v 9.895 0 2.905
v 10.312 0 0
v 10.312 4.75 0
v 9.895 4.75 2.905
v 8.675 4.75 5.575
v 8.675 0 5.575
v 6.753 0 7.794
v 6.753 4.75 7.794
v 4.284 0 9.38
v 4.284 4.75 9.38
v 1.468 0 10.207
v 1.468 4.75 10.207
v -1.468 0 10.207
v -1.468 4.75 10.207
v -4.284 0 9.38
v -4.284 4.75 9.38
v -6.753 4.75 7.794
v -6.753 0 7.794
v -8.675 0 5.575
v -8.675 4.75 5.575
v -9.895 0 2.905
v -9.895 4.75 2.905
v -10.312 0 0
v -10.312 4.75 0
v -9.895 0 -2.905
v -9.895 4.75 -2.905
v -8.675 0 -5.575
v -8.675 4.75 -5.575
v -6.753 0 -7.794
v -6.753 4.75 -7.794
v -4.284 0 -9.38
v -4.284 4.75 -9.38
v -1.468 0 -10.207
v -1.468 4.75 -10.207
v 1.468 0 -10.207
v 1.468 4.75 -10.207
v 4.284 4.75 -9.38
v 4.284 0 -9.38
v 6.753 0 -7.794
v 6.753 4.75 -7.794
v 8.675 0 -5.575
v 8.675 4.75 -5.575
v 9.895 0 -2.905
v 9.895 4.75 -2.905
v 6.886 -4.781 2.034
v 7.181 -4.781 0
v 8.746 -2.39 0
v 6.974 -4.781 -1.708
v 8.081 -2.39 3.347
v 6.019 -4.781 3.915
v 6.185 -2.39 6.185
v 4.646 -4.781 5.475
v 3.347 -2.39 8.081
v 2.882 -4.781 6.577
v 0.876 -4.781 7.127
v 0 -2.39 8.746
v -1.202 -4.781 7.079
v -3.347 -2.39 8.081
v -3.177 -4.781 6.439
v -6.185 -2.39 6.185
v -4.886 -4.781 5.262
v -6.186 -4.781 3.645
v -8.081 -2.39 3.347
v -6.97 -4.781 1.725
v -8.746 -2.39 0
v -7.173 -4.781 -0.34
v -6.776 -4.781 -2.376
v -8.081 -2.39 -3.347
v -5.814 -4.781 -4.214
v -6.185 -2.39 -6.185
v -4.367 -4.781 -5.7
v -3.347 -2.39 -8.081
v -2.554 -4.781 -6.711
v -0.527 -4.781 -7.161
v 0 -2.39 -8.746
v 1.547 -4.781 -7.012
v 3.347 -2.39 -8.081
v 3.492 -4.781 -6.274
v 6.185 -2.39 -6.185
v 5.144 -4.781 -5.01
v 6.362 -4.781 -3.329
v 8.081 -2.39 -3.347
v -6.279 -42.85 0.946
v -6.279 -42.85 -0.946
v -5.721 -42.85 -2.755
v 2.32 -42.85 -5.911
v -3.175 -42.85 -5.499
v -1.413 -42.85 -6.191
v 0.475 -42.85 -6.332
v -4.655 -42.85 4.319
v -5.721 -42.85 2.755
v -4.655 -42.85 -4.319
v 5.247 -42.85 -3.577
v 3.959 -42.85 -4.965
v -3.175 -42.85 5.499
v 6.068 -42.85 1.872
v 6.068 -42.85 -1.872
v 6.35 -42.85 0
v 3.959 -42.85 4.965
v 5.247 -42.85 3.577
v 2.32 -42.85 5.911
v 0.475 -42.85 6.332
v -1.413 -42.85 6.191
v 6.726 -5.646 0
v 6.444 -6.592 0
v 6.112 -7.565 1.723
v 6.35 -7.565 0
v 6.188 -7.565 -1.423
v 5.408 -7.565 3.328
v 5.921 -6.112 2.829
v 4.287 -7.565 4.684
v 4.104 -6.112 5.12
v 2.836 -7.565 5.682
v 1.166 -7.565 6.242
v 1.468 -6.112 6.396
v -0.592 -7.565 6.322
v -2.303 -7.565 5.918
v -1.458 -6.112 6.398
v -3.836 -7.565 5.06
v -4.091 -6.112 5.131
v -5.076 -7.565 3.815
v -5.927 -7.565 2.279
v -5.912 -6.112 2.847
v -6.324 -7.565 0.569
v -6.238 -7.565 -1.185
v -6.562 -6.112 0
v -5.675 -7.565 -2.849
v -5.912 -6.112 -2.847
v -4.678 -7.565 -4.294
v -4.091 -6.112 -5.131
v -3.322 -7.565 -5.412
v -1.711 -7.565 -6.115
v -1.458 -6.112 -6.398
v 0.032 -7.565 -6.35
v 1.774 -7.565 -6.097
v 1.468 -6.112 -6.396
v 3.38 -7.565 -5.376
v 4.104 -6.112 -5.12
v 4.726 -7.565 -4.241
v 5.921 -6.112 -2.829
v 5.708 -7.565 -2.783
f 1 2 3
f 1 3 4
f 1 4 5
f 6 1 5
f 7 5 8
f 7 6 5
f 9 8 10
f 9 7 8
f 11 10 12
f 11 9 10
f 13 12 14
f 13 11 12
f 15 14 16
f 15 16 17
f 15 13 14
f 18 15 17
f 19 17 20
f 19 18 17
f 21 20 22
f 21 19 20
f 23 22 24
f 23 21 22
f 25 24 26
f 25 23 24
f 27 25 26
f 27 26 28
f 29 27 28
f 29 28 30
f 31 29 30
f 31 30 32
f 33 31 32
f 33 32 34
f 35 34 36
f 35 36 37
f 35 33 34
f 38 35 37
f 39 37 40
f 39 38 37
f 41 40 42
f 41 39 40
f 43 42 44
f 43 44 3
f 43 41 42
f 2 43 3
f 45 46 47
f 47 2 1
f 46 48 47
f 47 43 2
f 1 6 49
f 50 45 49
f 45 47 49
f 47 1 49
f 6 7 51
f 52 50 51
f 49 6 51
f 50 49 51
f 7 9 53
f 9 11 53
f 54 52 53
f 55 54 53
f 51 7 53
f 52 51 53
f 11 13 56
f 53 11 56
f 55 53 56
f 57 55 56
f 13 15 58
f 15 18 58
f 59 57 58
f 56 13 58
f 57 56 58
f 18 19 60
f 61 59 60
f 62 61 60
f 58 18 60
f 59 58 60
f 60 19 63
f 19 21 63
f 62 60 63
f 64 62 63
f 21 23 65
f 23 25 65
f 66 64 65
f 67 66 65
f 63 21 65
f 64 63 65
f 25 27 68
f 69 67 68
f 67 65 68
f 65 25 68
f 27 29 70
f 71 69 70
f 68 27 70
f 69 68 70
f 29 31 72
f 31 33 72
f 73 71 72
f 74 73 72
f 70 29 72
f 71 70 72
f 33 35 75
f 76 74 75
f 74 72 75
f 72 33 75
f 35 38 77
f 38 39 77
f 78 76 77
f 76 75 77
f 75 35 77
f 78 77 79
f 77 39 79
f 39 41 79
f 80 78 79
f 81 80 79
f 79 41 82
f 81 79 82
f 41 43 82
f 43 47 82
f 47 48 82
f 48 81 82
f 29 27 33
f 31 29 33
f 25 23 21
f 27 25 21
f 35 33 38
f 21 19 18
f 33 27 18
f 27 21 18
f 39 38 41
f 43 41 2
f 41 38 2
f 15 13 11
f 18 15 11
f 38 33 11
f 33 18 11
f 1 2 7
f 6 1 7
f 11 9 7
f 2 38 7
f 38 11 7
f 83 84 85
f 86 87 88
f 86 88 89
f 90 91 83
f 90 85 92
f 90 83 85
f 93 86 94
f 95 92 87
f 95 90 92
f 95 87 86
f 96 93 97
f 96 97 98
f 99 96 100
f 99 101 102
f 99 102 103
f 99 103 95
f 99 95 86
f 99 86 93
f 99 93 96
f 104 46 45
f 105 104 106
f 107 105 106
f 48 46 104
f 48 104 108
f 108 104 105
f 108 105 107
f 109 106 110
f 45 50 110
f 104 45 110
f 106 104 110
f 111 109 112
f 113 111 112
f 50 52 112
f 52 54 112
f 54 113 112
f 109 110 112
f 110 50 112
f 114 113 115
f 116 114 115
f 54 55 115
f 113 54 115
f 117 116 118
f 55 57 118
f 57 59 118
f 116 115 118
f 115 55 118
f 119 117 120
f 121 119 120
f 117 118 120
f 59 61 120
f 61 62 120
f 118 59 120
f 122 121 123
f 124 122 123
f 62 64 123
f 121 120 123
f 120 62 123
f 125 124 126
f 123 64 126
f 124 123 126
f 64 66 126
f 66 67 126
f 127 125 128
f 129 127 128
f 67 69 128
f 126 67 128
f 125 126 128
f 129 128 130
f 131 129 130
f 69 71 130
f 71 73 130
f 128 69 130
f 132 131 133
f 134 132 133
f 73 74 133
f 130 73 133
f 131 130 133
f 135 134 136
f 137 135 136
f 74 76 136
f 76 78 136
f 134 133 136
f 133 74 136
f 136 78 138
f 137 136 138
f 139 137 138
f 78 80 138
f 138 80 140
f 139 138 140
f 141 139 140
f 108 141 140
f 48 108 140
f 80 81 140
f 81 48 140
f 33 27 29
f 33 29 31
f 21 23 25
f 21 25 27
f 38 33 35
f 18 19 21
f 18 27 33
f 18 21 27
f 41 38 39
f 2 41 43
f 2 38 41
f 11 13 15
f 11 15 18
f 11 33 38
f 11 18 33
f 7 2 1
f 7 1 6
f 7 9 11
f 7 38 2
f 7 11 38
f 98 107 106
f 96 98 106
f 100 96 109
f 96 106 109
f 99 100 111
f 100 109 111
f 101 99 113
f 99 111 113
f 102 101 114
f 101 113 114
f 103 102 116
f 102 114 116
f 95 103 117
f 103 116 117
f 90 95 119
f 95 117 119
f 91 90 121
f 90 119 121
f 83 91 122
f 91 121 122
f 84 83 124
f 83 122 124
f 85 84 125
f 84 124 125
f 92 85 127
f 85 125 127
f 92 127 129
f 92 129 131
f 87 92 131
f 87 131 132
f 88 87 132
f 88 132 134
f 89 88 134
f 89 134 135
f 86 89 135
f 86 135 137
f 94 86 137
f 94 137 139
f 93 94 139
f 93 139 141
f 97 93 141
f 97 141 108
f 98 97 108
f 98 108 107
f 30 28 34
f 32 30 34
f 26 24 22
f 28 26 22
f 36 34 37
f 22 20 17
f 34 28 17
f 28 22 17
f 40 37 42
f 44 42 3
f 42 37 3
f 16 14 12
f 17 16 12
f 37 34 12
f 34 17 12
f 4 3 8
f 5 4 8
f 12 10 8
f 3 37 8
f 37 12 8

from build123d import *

# Parameters (mm, degrees)
F0_R     = 6.35
F1_DEPTH = 42.8498
F0_R_2   = 10.3124
F2_DEPTH = 4.7498
F5_R     = 6.35
F6_R     = 10.3124
F8_R     = 5.08


with BuildPart() as f1:
    # F0 (on Front) → F1 (new body)
    with BuildSketch(Plane.XZ):
        Circle(F0_R)
    extrude(amount=F1_DEPTH)

    # F5 (on plane+point) → F7 section 0
    with BuildSketch(Plane.XZ.offset(6.0488656163)):
        Circle(F5_R)
    # F6 (on Front) → F7 section 1
    with BuildSketch(Plane.XZ):
        Circle(F6_R)
    loft()

    # F8
    f8_edges = [f1.edges().sort_by_distance(p)[0] for p in [
        (-6.35, -6.048866, 0),
    ]]
    fillet(f8_edges, radius=F8_R)


with BuildPart() as f2:
    # F0 (on Front) → F2 (new body)
    with BuildSketch(Plane.XZ):
        Circle(F0_R_2)
        Circle(F0_R, mode=Mode.SUBTRACT)
        Circle(F0_R)
    extrude(amount=-F2_DEPTH)


solid = Compound([f1.part, f2.part])
